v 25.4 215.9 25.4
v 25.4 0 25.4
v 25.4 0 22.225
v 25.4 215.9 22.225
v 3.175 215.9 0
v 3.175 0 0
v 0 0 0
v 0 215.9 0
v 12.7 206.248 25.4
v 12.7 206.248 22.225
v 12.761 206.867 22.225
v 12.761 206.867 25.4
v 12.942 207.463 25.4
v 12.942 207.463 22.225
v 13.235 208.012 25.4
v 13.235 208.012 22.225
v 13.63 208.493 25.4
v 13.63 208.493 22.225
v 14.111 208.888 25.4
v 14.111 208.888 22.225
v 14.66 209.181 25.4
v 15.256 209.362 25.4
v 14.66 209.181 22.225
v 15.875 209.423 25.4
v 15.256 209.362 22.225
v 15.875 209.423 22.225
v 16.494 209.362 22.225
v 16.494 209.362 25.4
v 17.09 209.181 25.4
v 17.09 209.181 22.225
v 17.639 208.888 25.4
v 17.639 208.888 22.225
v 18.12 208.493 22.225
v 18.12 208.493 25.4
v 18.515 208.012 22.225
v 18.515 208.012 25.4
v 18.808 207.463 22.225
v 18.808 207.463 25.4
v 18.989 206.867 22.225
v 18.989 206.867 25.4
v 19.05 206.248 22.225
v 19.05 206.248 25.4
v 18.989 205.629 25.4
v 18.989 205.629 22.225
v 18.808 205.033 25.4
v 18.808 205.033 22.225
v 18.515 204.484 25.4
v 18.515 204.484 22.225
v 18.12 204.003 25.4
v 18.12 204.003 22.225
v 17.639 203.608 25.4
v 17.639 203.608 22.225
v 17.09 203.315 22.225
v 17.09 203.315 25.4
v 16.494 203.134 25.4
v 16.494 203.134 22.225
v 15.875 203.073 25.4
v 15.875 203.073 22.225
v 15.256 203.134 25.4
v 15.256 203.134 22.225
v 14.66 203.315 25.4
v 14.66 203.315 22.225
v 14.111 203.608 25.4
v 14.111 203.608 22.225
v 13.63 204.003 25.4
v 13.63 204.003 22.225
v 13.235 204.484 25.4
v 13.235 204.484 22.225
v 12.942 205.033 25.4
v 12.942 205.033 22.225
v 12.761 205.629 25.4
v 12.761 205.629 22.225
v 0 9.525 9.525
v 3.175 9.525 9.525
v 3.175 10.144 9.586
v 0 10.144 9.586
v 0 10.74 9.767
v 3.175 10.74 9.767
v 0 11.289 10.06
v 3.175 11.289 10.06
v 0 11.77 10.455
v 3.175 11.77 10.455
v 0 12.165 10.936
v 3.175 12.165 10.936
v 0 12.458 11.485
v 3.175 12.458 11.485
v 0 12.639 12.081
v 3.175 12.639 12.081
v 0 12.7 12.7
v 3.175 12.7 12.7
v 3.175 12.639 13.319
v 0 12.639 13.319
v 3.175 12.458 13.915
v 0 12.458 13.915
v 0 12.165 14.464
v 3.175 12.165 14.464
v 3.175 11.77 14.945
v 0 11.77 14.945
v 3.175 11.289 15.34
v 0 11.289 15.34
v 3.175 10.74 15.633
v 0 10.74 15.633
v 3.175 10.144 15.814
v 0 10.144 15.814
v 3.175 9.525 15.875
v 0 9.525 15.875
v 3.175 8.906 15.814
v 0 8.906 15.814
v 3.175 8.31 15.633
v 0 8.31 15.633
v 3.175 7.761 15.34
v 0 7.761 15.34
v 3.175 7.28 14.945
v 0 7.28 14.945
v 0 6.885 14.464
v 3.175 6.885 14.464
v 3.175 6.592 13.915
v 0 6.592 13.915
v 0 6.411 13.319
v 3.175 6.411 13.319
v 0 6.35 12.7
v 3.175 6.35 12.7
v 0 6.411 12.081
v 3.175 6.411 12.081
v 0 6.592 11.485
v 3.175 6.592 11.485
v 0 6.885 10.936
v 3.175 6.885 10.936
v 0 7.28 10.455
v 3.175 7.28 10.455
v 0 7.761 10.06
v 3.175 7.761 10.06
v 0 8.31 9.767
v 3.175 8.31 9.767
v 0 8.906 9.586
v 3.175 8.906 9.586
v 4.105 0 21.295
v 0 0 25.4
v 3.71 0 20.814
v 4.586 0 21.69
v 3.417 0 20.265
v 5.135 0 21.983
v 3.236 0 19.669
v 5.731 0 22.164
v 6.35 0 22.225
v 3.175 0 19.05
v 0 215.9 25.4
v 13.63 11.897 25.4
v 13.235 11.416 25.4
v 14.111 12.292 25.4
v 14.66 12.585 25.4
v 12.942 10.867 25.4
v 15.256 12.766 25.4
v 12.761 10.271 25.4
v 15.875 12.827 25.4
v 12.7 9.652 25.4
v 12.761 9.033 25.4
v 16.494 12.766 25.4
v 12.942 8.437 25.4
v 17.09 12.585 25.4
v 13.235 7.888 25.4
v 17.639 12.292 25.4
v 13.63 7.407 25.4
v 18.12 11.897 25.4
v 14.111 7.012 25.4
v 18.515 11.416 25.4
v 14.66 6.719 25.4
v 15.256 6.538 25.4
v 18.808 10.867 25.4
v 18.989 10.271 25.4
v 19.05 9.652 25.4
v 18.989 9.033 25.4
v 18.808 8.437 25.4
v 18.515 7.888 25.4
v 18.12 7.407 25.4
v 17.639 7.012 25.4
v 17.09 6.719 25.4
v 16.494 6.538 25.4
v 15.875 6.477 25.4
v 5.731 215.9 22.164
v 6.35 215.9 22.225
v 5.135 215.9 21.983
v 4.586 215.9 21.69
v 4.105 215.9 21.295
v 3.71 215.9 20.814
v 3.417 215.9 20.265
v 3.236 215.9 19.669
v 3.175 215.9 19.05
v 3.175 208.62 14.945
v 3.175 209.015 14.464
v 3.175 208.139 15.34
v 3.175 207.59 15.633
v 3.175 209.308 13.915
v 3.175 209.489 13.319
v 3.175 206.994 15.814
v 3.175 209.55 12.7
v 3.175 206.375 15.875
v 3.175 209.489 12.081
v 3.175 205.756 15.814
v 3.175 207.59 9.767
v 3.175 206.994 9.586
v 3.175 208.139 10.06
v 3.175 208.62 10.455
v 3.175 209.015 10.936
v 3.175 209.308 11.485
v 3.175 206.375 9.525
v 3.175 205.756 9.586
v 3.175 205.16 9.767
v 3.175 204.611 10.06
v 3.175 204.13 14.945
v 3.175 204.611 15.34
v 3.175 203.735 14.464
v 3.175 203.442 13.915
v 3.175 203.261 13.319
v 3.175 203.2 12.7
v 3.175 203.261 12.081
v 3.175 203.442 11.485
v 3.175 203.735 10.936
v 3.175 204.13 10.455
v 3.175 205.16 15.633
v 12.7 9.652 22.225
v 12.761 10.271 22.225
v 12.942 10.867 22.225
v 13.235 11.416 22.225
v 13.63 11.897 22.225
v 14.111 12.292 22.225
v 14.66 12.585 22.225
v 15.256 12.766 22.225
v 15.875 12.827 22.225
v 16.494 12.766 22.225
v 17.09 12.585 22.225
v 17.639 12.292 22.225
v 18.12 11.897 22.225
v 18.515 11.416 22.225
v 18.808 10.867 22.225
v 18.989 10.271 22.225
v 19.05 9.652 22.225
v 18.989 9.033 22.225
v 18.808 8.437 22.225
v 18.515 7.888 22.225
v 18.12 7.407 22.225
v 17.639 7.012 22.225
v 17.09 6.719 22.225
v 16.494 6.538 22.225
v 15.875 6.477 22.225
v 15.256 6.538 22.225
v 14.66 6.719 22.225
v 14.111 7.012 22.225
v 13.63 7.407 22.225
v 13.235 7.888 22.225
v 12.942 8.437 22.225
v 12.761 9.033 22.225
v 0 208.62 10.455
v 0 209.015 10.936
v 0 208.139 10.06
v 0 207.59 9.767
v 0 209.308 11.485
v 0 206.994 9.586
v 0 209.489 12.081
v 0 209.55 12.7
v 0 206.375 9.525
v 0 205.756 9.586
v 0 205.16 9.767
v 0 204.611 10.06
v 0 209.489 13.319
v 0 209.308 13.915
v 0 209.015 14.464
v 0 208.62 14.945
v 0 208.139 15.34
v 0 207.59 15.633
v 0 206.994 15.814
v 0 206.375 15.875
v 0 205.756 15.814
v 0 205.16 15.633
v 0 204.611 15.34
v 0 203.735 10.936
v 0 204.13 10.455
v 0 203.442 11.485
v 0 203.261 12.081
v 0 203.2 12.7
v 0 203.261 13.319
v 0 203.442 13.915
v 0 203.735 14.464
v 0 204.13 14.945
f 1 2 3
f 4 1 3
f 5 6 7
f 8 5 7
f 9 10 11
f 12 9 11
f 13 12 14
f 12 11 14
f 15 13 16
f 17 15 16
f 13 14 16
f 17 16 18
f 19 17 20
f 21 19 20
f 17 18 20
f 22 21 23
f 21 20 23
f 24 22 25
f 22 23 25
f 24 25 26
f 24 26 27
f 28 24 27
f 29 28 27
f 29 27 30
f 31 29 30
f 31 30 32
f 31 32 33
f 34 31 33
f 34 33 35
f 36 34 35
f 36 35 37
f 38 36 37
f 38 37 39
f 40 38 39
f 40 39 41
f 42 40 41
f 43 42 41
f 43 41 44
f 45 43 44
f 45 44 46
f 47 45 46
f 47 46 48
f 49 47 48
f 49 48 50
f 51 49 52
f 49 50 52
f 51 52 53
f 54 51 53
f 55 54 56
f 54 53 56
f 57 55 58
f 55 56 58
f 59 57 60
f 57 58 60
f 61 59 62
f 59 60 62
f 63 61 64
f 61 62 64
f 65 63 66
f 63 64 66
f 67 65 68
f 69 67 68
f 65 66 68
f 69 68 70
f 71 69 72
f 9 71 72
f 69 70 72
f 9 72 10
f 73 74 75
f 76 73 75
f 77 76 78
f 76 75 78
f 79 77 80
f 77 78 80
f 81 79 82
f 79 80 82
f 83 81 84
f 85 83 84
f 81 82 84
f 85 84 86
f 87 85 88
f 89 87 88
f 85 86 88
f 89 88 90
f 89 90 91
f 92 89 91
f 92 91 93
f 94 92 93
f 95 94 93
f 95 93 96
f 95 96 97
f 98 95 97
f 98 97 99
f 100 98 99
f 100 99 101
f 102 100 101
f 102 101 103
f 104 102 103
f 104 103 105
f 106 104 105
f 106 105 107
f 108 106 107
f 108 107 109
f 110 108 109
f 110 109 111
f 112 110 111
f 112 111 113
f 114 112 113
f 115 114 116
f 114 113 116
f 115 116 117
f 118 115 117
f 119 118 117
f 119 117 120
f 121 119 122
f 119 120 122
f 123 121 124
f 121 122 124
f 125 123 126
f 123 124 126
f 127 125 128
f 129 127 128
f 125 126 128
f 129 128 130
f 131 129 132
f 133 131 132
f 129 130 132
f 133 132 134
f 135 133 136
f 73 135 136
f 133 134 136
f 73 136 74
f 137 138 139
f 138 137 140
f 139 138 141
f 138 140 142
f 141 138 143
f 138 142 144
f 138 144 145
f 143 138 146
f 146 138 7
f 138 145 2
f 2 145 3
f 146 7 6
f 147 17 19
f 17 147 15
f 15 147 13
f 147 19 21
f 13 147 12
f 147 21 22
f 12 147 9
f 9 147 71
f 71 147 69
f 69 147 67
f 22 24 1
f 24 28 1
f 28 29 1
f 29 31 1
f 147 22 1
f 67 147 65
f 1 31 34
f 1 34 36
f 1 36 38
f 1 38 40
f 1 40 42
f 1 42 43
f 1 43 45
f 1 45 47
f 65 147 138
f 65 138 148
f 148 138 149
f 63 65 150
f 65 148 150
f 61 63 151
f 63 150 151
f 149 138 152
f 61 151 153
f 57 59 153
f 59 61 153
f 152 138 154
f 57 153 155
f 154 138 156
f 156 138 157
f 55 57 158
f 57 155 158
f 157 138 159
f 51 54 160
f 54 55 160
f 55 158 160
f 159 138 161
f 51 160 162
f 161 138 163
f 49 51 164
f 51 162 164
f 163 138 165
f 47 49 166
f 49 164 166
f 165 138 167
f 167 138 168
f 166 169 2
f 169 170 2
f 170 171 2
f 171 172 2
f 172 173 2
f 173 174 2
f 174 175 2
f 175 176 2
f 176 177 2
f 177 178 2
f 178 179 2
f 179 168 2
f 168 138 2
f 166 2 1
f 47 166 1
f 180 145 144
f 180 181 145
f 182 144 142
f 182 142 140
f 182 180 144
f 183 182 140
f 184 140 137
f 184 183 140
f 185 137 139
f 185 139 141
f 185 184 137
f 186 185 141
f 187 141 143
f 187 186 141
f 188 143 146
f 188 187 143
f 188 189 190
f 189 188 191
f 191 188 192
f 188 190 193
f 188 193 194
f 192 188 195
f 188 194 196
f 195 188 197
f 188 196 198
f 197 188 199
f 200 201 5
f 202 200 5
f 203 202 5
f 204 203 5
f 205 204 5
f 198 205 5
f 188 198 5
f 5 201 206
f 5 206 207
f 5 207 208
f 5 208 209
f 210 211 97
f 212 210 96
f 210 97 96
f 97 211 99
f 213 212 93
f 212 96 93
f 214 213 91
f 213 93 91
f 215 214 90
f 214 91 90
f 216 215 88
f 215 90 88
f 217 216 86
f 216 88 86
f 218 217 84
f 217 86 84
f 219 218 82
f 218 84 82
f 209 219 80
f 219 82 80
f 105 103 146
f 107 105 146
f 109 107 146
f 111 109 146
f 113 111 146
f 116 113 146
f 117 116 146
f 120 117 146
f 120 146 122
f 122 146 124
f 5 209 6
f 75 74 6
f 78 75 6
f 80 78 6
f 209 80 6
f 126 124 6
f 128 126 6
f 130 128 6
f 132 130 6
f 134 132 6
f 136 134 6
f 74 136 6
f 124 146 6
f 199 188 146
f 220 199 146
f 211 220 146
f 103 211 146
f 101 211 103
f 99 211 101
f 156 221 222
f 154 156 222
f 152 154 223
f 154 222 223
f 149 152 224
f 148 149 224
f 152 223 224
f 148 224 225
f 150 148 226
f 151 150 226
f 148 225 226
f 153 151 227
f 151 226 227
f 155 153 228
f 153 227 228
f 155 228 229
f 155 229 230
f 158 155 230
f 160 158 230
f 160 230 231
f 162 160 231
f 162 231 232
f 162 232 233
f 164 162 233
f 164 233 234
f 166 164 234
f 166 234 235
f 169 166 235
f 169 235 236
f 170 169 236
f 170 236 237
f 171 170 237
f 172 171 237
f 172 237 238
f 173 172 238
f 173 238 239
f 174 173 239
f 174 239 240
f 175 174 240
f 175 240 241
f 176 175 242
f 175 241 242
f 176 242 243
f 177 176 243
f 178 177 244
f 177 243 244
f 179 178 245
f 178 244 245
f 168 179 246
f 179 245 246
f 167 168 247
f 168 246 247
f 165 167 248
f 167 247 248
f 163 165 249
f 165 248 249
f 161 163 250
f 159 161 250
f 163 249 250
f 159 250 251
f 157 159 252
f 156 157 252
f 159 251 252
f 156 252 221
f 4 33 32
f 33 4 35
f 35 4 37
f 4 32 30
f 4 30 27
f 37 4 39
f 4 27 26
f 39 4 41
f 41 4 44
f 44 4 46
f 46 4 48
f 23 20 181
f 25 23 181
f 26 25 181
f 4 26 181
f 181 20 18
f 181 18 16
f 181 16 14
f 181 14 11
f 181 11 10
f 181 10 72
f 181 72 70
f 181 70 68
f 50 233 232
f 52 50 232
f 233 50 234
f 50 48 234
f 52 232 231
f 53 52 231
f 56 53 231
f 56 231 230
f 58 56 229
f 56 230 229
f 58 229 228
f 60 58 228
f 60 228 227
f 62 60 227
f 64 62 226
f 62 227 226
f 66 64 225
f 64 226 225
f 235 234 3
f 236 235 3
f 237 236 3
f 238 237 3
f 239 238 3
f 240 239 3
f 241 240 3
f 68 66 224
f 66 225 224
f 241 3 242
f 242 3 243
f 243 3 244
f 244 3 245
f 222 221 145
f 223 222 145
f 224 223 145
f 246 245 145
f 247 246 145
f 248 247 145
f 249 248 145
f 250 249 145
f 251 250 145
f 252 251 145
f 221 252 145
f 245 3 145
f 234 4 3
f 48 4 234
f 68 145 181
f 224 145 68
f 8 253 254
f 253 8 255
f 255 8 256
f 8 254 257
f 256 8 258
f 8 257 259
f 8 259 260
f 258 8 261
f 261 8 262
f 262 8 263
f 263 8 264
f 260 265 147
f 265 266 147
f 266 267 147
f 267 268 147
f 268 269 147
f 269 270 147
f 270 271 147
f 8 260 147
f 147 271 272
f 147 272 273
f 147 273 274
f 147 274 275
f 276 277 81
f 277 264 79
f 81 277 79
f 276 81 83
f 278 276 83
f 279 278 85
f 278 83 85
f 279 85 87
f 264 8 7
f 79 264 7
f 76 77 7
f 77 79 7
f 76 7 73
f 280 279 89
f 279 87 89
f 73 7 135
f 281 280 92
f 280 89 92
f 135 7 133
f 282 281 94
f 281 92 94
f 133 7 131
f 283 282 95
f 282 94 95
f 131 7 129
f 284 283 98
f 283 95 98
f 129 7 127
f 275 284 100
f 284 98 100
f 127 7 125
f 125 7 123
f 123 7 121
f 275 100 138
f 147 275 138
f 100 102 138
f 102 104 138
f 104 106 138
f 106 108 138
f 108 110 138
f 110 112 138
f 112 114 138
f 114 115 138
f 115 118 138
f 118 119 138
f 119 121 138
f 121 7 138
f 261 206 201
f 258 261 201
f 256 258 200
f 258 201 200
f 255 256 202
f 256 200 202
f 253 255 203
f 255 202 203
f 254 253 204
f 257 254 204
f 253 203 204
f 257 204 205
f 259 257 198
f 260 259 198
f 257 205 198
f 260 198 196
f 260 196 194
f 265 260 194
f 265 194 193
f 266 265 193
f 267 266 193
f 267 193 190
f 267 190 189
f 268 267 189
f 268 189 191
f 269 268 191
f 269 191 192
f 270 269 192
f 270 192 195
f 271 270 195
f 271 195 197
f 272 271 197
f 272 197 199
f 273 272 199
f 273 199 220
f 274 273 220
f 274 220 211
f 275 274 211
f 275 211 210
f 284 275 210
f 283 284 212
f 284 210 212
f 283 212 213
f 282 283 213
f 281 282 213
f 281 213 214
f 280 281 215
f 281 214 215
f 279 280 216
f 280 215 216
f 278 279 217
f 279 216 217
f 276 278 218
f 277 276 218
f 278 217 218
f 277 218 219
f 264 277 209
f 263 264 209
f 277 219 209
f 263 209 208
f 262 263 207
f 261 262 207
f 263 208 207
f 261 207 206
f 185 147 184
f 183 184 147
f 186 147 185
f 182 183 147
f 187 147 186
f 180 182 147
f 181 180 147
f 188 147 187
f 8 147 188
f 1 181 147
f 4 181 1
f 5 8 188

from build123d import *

# Parameters (mm, degrees)
BOSS_EXTRUDE1_DEPTH = 215.9
FILLET1_R           = 3.175
SKETCH2_R           = 3.175
CUT_EXTRUDE1_DEPTH  = 219.522128456
SKETCH3_R           = 3.175
CUT_EXTRUDE2_DEPTH  = 219.522128456
SKETCH4_R           = 3.175
CUT_EXTRUDE3_DEPTH  = 219.522128456
SKETCH5_R           = 3.175
CUT_EXTRUDE4_DEPTH  = 219.522128456


with BuildPart() as part:
    # Sketch1 → Boss-Extrude1 (new body)
    with BuildSketch(Plane(origin=(0, 0, 0), x_dir=(1, 0, 0), z_dir=(0, 1, 0))):
        Polygon((0, 0), (0, -25.4), (25.4, -25.4), (25.4, -22.225), (3.175, -22.225), (3.175, 0), align=None)
    extrude(amount=BOSS_EXTRUDE1_DEPTH)

    # Fillet1
    fillet1_edges = [part.edges().sort_by_distance(p)[0] for p in [
        (3.175, 107.95, 22.225),
    ]]
    fillet(fillet1_edges, radius=FILLET1_R)

    # Sketch2 → Cut-Extrude1 (cut, through all)
    with BuildSketch(Plane(origin=(0, 0, 22.225), x_dir=(-1, 0, 0), z_dir=(0, 0, -1))):
        with Locations((-15.875, 206.248)):
            Circle(SKETCH2_R)
    extrude(amount=-CUT_EXTRUDE1_DEPTH, mode=Mode.SUBTRACT)

    # Sketch3 → Cut-Extrude2 (cut, through all)
    with BuildSketch(Plane(origin=(0, 0, 22.225), x_dir=(-1, 0, 0), z_dir=(0, 0, -1))):
        with Locations((-15.875, 9.652)):
            Circle(SKETCH3_R)
    extrude(amount=-CUT_EXTRUDE2_DEPTH, mode=Mode.SUBTRACT)

    # Sketch4 → Cut-Extrude3 (cut, through all)
    with BuildSketch(Plane(origin=(3.175, 0, 0), x_dir=(0, 0, -1), z_dir=(1, 0, 0))):
        with Locations((-12.7, 206.375)):
            Circle(SKETCH4_R)
    extrude(amount=-CUT_EXTRUDE3_DEPTH, mode=Mode.SUBTRACT)

    # Sketch5 → Cut-Extrude4 (cut, through all)
    with BuildSketch(Plane(origin=(3.175, 0, 0), x_dir=(0, 0, -1), z_dir=(1, 0, 0))):
        with Locations((-12.7, 9.525)):
            Circle(SKETCH5_R)
    extrude(amount=-CUT_EXTRUDE4_DEPTH, mode=Mode.SUBTRACT)


solid = part.part
